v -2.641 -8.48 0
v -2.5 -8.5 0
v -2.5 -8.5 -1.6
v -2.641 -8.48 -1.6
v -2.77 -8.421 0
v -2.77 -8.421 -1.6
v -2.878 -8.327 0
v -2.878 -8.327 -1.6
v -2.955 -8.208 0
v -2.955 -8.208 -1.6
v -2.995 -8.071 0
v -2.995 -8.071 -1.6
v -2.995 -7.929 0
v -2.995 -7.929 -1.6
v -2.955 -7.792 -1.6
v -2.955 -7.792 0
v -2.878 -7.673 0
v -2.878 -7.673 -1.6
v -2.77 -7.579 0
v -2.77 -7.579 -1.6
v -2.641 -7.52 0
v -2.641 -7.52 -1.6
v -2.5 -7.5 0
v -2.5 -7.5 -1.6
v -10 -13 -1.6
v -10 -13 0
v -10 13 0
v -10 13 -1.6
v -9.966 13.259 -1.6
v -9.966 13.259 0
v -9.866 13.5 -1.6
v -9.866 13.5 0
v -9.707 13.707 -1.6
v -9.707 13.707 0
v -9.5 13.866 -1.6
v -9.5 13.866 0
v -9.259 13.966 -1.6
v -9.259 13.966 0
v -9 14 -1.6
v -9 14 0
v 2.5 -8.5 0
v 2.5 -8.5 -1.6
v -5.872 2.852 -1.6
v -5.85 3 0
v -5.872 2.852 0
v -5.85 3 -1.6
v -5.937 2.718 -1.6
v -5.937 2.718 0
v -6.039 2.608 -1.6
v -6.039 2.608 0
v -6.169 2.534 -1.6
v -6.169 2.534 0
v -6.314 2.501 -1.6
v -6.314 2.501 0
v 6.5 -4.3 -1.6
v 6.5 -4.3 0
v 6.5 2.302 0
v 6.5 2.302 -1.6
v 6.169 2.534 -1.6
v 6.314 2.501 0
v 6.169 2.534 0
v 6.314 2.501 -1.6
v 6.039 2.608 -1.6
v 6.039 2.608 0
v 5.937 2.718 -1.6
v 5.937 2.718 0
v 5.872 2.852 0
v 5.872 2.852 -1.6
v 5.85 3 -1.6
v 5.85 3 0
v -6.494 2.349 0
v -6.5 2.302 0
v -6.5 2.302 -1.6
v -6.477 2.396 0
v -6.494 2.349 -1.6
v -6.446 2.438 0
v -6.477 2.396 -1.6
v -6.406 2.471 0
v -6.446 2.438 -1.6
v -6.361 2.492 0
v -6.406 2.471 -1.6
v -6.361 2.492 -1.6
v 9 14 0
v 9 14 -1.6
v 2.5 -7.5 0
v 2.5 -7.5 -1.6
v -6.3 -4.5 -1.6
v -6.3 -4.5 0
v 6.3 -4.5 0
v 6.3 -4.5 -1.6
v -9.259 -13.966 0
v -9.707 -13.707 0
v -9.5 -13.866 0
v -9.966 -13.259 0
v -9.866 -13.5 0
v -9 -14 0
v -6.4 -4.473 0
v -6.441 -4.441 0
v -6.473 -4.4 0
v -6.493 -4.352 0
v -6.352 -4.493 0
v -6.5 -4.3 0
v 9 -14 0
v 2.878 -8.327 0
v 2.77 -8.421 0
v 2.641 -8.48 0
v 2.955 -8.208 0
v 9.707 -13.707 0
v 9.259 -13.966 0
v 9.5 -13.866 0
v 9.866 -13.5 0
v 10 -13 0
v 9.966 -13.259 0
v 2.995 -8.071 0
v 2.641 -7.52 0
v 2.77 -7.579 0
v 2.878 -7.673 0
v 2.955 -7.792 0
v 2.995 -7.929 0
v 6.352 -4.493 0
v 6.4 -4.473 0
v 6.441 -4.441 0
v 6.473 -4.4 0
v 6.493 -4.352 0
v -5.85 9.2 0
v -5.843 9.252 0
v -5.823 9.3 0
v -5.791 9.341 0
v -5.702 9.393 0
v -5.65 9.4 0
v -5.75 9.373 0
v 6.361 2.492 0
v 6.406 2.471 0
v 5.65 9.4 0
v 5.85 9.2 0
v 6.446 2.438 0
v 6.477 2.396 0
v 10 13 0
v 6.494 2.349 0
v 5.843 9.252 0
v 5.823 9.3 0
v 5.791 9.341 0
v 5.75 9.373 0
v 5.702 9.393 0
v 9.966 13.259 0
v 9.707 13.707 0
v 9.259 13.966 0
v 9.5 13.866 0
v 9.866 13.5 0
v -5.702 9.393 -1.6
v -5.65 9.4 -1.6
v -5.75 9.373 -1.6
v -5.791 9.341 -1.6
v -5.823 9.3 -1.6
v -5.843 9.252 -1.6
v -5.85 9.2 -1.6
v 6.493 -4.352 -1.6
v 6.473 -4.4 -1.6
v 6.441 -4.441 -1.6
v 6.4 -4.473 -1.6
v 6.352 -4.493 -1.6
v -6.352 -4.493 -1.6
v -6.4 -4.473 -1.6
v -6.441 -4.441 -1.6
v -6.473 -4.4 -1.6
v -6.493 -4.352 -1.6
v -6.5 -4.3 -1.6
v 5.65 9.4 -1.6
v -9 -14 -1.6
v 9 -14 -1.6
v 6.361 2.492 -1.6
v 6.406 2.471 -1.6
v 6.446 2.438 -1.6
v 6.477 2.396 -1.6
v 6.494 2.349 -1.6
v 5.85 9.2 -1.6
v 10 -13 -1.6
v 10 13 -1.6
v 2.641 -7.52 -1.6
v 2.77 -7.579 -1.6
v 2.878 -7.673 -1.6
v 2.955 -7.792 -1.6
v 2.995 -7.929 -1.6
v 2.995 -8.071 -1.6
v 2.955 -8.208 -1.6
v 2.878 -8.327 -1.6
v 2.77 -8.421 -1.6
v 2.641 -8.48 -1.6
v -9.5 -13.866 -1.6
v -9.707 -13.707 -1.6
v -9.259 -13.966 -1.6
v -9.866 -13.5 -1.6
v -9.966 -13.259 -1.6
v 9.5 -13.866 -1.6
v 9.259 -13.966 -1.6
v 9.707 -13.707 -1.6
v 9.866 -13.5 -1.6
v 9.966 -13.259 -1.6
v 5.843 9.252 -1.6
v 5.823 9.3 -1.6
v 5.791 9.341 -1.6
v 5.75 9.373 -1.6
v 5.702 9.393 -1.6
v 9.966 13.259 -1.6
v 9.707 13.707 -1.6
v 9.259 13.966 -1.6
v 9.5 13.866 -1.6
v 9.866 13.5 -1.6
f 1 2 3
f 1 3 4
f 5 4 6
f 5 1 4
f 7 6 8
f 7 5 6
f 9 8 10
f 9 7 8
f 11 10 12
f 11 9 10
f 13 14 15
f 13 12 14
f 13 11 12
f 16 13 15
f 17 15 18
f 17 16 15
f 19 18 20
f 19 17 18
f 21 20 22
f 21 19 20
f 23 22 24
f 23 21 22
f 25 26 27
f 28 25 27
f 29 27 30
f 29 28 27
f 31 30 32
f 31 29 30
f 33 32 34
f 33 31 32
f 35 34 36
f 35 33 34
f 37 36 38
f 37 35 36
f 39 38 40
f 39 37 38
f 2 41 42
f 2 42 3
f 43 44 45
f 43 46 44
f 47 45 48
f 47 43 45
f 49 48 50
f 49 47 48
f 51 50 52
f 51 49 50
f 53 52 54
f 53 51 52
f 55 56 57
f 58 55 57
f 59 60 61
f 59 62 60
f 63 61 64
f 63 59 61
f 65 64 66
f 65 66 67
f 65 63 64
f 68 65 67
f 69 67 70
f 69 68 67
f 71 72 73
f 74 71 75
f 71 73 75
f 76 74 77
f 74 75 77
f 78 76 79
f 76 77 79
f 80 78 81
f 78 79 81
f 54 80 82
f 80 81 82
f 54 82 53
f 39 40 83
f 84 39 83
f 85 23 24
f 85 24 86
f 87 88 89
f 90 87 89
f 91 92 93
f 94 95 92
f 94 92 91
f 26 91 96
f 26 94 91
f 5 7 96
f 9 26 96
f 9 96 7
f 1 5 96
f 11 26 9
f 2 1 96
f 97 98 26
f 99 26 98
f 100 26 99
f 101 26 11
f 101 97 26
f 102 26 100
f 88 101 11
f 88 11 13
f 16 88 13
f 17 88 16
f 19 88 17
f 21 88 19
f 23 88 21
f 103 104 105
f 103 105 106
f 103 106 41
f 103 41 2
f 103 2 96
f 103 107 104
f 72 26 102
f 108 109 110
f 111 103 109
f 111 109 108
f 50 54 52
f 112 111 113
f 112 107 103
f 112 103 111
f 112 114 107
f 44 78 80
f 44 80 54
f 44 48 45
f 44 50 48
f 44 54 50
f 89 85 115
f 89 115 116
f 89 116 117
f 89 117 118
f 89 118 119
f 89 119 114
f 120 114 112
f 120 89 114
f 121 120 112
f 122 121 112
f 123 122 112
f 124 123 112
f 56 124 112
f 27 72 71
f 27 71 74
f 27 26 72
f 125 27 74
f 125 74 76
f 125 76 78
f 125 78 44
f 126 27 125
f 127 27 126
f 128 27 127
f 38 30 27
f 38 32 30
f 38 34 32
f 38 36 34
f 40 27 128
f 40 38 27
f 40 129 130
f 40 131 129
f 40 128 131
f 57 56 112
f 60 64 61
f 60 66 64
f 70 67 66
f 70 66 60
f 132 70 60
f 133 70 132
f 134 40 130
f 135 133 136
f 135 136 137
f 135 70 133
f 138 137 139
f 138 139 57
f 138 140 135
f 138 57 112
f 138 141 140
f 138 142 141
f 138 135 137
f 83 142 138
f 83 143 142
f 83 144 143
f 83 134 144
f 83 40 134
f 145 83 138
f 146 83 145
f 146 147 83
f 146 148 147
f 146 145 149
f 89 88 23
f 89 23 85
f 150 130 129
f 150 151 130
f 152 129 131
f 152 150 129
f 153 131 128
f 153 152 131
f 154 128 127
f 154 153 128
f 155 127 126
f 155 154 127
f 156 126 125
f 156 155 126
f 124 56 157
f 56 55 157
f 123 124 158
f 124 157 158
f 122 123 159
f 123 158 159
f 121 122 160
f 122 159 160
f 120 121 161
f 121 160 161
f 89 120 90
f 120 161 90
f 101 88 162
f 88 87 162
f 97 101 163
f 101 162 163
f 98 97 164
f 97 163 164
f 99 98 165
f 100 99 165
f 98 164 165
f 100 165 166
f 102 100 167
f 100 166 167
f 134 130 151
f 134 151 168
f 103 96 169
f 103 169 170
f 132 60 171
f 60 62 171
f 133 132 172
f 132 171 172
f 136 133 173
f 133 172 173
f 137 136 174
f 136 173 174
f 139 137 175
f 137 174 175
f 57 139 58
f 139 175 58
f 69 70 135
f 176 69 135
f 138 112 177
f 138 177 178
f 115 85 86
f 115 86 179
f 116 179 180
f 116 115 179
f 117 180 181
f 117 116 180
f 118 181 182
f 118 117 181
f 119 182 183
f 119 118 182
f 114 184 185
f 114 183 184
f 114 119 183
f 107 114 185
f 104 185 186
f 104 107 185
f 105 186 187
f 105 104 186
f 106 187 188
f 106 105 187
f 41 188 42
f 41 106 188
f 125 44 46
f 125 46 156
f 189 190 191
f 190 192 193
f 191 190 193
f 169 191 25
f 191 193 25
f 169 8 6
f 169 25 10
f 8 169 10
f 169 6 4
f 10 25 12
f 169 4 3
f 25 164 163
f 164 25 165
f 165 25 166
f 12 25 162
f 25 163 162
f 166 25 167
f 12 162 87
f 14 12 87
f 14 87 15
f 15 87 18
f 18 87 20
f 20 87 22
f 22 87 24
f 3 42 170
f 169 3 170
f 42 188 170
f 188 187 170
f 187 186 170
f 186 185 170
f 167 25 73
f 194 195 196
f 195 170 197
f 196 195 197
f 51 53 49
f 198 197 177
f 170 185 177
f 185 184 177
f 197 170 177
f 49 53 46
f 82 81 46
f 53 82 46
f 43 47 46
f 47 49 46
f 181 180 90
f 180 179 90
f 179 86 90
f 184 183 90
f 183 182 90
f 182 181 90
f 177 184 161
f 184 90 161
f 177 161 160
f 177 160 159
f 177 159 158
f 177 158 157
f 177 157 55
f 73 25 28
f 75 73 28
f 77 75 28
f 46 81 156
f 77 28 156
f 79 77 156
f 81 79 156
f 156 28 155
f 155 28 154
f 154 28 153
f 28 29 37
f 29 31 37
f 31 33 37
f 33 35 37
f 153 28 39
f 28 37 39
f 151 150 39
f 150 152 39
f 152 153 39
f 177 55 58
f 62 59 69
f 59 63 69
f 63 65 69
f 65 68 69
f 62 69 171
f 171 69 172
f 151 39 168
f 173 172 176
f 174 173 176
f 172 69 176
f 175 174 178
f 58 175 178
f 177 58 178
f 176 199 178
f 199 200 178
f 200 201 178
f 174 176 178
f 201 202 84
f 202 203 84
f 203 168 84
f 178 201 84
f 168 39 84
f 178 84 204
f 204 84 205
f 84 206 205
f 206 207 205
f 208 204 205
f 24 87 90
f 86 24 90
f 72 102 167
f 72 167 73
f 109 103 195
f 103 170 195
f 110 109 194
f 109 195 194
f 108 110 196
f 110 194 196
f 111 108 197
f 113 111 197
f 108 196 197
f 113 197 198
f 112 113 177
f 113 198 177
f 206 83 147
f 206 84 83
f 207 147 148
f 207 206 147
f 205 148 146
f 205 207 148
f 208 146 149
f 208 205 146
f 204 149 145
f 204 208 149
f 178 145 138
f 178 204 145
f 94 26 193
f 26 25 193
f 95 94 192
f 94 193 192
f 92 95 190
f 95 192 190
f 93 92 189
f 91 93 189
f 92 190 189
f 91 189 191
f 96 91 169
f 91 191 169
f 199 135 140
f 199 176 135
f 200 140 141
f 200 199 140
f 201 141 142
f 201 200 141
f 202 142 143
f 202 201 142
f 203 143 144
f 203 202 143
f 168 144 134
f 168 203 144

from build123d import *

# Parameters (mm, degrees)
MAINBODYS_W                = 20
MAINBODYS_H                = 28
MAIN_BODY_DEPTH            = 1.6
GROUND_CUT_DEPTH           = 18.278888853
MIDCUTS_W                  = 13
MIDCUTS_H                  = 7
MID_CUT_DEPTH              = 18.278888853
TOPPOWERACCESSCUTS_W       = 11.7
TOPPOWERACCESSCUTS_H       = 6.9
TOP_POWER_ACCESS_CUT_DEPTH = 18.278888853
MC_FILLET_R                = 0.5
ALL_INNER_CUTS_FILLETS_R   = 0.2
OUTER_FILLETS_R            = 1


with BuildPart() as part:
    # MainBodyS → MAIN BODY (new body)
    with BuildSketch(Plane.XY):
        Rectangle(MAINBODYS_W, MAINBODYS_H)
    extrude(amount=-MAIN_BODY_DEPTH)

    # GroundCutS → GROUND CUT (cut, through all)
    with BuildSketch(Plane.XY):
        with BuildLine():
            Line((-2.5, -7.5), (2.5, -7.5))
            ThreePointArc((2.5, -7.5), (3, -8), (2.5, -8.5))
            Line((2.5, -8.5), (-2.5, -8.5))
            ThreePointArc((-2.5, -8.5), (-3, -8), (-2.5, -7.5))
        make_face()
    extrude(amount=-GROUND_CUT_DEPTH, mode=Mode.SUBTRACT)

    # MidCutS → MID CUT (cut, through all)
    with BuildSketch(Plane.XY):
        with Locations((0, -1)):
            Rectangle(MIDCUTS_W, MIDCUTS_H)
    extrude(amount=-MID_CUT_DEPTH, mode=Mode.SUBTRACT)

    # TopPowerAccessCutS → TOP POWER ACCESS CUT (cut, through all)
    with BuildSketch(Plane.XY):
        with Locations((0, 5.95)):
            Rectangle(TOPPOWERACCESSCUTS_W, TOPPOWERACCESSCUTS_H)
    extrude(amount=-TOP_POWER_ACCESS_CUT_DEPTH, mode=Mode.SUBTRACT)

    # MC FILLET
    mc_fillet_edges = [part.edges().sort_by_distance(p)[0] for p in [
        (5.85, 2.5, -0.8),
        (-5.85, 2.5, -0.8),
    ]]
    fillet(mc_fillet_edges, radius=MC_FILLET_R)

    # ALL INNER CUTS FILLETS
    all_inner_cuts_fillets_edges = [part.edges().sort_by_distance(p)[0] for p in [
        (-6.5, -4.5, -0.8),
        (6.5, -4.5, -0.8),
        (6.5, 2.5, -0.8),
        (-6.5, 2.5, -0.8),
        (-5.85, 9.4, -0.8),
        (5.85, 9.4, -0.8),
    ]]
    fillet(all_inner_cuts_fillets_edges, radius=ALL_INNER_CUTS_FILLETS_R)

    # OUTER FILLETS
    outer_fillets_edges = [part.edges().sort_by_distance(p)[0] for p in [
        (10, -14, -0.8),
        (-10, -14, -0.8),
        (-10, 14, -0.8),
        (10, 14, -0.8),
    ]]
    fillet(outer_fillets_edges, radius=OUTER_FILLETS_R)


solid = part.part
